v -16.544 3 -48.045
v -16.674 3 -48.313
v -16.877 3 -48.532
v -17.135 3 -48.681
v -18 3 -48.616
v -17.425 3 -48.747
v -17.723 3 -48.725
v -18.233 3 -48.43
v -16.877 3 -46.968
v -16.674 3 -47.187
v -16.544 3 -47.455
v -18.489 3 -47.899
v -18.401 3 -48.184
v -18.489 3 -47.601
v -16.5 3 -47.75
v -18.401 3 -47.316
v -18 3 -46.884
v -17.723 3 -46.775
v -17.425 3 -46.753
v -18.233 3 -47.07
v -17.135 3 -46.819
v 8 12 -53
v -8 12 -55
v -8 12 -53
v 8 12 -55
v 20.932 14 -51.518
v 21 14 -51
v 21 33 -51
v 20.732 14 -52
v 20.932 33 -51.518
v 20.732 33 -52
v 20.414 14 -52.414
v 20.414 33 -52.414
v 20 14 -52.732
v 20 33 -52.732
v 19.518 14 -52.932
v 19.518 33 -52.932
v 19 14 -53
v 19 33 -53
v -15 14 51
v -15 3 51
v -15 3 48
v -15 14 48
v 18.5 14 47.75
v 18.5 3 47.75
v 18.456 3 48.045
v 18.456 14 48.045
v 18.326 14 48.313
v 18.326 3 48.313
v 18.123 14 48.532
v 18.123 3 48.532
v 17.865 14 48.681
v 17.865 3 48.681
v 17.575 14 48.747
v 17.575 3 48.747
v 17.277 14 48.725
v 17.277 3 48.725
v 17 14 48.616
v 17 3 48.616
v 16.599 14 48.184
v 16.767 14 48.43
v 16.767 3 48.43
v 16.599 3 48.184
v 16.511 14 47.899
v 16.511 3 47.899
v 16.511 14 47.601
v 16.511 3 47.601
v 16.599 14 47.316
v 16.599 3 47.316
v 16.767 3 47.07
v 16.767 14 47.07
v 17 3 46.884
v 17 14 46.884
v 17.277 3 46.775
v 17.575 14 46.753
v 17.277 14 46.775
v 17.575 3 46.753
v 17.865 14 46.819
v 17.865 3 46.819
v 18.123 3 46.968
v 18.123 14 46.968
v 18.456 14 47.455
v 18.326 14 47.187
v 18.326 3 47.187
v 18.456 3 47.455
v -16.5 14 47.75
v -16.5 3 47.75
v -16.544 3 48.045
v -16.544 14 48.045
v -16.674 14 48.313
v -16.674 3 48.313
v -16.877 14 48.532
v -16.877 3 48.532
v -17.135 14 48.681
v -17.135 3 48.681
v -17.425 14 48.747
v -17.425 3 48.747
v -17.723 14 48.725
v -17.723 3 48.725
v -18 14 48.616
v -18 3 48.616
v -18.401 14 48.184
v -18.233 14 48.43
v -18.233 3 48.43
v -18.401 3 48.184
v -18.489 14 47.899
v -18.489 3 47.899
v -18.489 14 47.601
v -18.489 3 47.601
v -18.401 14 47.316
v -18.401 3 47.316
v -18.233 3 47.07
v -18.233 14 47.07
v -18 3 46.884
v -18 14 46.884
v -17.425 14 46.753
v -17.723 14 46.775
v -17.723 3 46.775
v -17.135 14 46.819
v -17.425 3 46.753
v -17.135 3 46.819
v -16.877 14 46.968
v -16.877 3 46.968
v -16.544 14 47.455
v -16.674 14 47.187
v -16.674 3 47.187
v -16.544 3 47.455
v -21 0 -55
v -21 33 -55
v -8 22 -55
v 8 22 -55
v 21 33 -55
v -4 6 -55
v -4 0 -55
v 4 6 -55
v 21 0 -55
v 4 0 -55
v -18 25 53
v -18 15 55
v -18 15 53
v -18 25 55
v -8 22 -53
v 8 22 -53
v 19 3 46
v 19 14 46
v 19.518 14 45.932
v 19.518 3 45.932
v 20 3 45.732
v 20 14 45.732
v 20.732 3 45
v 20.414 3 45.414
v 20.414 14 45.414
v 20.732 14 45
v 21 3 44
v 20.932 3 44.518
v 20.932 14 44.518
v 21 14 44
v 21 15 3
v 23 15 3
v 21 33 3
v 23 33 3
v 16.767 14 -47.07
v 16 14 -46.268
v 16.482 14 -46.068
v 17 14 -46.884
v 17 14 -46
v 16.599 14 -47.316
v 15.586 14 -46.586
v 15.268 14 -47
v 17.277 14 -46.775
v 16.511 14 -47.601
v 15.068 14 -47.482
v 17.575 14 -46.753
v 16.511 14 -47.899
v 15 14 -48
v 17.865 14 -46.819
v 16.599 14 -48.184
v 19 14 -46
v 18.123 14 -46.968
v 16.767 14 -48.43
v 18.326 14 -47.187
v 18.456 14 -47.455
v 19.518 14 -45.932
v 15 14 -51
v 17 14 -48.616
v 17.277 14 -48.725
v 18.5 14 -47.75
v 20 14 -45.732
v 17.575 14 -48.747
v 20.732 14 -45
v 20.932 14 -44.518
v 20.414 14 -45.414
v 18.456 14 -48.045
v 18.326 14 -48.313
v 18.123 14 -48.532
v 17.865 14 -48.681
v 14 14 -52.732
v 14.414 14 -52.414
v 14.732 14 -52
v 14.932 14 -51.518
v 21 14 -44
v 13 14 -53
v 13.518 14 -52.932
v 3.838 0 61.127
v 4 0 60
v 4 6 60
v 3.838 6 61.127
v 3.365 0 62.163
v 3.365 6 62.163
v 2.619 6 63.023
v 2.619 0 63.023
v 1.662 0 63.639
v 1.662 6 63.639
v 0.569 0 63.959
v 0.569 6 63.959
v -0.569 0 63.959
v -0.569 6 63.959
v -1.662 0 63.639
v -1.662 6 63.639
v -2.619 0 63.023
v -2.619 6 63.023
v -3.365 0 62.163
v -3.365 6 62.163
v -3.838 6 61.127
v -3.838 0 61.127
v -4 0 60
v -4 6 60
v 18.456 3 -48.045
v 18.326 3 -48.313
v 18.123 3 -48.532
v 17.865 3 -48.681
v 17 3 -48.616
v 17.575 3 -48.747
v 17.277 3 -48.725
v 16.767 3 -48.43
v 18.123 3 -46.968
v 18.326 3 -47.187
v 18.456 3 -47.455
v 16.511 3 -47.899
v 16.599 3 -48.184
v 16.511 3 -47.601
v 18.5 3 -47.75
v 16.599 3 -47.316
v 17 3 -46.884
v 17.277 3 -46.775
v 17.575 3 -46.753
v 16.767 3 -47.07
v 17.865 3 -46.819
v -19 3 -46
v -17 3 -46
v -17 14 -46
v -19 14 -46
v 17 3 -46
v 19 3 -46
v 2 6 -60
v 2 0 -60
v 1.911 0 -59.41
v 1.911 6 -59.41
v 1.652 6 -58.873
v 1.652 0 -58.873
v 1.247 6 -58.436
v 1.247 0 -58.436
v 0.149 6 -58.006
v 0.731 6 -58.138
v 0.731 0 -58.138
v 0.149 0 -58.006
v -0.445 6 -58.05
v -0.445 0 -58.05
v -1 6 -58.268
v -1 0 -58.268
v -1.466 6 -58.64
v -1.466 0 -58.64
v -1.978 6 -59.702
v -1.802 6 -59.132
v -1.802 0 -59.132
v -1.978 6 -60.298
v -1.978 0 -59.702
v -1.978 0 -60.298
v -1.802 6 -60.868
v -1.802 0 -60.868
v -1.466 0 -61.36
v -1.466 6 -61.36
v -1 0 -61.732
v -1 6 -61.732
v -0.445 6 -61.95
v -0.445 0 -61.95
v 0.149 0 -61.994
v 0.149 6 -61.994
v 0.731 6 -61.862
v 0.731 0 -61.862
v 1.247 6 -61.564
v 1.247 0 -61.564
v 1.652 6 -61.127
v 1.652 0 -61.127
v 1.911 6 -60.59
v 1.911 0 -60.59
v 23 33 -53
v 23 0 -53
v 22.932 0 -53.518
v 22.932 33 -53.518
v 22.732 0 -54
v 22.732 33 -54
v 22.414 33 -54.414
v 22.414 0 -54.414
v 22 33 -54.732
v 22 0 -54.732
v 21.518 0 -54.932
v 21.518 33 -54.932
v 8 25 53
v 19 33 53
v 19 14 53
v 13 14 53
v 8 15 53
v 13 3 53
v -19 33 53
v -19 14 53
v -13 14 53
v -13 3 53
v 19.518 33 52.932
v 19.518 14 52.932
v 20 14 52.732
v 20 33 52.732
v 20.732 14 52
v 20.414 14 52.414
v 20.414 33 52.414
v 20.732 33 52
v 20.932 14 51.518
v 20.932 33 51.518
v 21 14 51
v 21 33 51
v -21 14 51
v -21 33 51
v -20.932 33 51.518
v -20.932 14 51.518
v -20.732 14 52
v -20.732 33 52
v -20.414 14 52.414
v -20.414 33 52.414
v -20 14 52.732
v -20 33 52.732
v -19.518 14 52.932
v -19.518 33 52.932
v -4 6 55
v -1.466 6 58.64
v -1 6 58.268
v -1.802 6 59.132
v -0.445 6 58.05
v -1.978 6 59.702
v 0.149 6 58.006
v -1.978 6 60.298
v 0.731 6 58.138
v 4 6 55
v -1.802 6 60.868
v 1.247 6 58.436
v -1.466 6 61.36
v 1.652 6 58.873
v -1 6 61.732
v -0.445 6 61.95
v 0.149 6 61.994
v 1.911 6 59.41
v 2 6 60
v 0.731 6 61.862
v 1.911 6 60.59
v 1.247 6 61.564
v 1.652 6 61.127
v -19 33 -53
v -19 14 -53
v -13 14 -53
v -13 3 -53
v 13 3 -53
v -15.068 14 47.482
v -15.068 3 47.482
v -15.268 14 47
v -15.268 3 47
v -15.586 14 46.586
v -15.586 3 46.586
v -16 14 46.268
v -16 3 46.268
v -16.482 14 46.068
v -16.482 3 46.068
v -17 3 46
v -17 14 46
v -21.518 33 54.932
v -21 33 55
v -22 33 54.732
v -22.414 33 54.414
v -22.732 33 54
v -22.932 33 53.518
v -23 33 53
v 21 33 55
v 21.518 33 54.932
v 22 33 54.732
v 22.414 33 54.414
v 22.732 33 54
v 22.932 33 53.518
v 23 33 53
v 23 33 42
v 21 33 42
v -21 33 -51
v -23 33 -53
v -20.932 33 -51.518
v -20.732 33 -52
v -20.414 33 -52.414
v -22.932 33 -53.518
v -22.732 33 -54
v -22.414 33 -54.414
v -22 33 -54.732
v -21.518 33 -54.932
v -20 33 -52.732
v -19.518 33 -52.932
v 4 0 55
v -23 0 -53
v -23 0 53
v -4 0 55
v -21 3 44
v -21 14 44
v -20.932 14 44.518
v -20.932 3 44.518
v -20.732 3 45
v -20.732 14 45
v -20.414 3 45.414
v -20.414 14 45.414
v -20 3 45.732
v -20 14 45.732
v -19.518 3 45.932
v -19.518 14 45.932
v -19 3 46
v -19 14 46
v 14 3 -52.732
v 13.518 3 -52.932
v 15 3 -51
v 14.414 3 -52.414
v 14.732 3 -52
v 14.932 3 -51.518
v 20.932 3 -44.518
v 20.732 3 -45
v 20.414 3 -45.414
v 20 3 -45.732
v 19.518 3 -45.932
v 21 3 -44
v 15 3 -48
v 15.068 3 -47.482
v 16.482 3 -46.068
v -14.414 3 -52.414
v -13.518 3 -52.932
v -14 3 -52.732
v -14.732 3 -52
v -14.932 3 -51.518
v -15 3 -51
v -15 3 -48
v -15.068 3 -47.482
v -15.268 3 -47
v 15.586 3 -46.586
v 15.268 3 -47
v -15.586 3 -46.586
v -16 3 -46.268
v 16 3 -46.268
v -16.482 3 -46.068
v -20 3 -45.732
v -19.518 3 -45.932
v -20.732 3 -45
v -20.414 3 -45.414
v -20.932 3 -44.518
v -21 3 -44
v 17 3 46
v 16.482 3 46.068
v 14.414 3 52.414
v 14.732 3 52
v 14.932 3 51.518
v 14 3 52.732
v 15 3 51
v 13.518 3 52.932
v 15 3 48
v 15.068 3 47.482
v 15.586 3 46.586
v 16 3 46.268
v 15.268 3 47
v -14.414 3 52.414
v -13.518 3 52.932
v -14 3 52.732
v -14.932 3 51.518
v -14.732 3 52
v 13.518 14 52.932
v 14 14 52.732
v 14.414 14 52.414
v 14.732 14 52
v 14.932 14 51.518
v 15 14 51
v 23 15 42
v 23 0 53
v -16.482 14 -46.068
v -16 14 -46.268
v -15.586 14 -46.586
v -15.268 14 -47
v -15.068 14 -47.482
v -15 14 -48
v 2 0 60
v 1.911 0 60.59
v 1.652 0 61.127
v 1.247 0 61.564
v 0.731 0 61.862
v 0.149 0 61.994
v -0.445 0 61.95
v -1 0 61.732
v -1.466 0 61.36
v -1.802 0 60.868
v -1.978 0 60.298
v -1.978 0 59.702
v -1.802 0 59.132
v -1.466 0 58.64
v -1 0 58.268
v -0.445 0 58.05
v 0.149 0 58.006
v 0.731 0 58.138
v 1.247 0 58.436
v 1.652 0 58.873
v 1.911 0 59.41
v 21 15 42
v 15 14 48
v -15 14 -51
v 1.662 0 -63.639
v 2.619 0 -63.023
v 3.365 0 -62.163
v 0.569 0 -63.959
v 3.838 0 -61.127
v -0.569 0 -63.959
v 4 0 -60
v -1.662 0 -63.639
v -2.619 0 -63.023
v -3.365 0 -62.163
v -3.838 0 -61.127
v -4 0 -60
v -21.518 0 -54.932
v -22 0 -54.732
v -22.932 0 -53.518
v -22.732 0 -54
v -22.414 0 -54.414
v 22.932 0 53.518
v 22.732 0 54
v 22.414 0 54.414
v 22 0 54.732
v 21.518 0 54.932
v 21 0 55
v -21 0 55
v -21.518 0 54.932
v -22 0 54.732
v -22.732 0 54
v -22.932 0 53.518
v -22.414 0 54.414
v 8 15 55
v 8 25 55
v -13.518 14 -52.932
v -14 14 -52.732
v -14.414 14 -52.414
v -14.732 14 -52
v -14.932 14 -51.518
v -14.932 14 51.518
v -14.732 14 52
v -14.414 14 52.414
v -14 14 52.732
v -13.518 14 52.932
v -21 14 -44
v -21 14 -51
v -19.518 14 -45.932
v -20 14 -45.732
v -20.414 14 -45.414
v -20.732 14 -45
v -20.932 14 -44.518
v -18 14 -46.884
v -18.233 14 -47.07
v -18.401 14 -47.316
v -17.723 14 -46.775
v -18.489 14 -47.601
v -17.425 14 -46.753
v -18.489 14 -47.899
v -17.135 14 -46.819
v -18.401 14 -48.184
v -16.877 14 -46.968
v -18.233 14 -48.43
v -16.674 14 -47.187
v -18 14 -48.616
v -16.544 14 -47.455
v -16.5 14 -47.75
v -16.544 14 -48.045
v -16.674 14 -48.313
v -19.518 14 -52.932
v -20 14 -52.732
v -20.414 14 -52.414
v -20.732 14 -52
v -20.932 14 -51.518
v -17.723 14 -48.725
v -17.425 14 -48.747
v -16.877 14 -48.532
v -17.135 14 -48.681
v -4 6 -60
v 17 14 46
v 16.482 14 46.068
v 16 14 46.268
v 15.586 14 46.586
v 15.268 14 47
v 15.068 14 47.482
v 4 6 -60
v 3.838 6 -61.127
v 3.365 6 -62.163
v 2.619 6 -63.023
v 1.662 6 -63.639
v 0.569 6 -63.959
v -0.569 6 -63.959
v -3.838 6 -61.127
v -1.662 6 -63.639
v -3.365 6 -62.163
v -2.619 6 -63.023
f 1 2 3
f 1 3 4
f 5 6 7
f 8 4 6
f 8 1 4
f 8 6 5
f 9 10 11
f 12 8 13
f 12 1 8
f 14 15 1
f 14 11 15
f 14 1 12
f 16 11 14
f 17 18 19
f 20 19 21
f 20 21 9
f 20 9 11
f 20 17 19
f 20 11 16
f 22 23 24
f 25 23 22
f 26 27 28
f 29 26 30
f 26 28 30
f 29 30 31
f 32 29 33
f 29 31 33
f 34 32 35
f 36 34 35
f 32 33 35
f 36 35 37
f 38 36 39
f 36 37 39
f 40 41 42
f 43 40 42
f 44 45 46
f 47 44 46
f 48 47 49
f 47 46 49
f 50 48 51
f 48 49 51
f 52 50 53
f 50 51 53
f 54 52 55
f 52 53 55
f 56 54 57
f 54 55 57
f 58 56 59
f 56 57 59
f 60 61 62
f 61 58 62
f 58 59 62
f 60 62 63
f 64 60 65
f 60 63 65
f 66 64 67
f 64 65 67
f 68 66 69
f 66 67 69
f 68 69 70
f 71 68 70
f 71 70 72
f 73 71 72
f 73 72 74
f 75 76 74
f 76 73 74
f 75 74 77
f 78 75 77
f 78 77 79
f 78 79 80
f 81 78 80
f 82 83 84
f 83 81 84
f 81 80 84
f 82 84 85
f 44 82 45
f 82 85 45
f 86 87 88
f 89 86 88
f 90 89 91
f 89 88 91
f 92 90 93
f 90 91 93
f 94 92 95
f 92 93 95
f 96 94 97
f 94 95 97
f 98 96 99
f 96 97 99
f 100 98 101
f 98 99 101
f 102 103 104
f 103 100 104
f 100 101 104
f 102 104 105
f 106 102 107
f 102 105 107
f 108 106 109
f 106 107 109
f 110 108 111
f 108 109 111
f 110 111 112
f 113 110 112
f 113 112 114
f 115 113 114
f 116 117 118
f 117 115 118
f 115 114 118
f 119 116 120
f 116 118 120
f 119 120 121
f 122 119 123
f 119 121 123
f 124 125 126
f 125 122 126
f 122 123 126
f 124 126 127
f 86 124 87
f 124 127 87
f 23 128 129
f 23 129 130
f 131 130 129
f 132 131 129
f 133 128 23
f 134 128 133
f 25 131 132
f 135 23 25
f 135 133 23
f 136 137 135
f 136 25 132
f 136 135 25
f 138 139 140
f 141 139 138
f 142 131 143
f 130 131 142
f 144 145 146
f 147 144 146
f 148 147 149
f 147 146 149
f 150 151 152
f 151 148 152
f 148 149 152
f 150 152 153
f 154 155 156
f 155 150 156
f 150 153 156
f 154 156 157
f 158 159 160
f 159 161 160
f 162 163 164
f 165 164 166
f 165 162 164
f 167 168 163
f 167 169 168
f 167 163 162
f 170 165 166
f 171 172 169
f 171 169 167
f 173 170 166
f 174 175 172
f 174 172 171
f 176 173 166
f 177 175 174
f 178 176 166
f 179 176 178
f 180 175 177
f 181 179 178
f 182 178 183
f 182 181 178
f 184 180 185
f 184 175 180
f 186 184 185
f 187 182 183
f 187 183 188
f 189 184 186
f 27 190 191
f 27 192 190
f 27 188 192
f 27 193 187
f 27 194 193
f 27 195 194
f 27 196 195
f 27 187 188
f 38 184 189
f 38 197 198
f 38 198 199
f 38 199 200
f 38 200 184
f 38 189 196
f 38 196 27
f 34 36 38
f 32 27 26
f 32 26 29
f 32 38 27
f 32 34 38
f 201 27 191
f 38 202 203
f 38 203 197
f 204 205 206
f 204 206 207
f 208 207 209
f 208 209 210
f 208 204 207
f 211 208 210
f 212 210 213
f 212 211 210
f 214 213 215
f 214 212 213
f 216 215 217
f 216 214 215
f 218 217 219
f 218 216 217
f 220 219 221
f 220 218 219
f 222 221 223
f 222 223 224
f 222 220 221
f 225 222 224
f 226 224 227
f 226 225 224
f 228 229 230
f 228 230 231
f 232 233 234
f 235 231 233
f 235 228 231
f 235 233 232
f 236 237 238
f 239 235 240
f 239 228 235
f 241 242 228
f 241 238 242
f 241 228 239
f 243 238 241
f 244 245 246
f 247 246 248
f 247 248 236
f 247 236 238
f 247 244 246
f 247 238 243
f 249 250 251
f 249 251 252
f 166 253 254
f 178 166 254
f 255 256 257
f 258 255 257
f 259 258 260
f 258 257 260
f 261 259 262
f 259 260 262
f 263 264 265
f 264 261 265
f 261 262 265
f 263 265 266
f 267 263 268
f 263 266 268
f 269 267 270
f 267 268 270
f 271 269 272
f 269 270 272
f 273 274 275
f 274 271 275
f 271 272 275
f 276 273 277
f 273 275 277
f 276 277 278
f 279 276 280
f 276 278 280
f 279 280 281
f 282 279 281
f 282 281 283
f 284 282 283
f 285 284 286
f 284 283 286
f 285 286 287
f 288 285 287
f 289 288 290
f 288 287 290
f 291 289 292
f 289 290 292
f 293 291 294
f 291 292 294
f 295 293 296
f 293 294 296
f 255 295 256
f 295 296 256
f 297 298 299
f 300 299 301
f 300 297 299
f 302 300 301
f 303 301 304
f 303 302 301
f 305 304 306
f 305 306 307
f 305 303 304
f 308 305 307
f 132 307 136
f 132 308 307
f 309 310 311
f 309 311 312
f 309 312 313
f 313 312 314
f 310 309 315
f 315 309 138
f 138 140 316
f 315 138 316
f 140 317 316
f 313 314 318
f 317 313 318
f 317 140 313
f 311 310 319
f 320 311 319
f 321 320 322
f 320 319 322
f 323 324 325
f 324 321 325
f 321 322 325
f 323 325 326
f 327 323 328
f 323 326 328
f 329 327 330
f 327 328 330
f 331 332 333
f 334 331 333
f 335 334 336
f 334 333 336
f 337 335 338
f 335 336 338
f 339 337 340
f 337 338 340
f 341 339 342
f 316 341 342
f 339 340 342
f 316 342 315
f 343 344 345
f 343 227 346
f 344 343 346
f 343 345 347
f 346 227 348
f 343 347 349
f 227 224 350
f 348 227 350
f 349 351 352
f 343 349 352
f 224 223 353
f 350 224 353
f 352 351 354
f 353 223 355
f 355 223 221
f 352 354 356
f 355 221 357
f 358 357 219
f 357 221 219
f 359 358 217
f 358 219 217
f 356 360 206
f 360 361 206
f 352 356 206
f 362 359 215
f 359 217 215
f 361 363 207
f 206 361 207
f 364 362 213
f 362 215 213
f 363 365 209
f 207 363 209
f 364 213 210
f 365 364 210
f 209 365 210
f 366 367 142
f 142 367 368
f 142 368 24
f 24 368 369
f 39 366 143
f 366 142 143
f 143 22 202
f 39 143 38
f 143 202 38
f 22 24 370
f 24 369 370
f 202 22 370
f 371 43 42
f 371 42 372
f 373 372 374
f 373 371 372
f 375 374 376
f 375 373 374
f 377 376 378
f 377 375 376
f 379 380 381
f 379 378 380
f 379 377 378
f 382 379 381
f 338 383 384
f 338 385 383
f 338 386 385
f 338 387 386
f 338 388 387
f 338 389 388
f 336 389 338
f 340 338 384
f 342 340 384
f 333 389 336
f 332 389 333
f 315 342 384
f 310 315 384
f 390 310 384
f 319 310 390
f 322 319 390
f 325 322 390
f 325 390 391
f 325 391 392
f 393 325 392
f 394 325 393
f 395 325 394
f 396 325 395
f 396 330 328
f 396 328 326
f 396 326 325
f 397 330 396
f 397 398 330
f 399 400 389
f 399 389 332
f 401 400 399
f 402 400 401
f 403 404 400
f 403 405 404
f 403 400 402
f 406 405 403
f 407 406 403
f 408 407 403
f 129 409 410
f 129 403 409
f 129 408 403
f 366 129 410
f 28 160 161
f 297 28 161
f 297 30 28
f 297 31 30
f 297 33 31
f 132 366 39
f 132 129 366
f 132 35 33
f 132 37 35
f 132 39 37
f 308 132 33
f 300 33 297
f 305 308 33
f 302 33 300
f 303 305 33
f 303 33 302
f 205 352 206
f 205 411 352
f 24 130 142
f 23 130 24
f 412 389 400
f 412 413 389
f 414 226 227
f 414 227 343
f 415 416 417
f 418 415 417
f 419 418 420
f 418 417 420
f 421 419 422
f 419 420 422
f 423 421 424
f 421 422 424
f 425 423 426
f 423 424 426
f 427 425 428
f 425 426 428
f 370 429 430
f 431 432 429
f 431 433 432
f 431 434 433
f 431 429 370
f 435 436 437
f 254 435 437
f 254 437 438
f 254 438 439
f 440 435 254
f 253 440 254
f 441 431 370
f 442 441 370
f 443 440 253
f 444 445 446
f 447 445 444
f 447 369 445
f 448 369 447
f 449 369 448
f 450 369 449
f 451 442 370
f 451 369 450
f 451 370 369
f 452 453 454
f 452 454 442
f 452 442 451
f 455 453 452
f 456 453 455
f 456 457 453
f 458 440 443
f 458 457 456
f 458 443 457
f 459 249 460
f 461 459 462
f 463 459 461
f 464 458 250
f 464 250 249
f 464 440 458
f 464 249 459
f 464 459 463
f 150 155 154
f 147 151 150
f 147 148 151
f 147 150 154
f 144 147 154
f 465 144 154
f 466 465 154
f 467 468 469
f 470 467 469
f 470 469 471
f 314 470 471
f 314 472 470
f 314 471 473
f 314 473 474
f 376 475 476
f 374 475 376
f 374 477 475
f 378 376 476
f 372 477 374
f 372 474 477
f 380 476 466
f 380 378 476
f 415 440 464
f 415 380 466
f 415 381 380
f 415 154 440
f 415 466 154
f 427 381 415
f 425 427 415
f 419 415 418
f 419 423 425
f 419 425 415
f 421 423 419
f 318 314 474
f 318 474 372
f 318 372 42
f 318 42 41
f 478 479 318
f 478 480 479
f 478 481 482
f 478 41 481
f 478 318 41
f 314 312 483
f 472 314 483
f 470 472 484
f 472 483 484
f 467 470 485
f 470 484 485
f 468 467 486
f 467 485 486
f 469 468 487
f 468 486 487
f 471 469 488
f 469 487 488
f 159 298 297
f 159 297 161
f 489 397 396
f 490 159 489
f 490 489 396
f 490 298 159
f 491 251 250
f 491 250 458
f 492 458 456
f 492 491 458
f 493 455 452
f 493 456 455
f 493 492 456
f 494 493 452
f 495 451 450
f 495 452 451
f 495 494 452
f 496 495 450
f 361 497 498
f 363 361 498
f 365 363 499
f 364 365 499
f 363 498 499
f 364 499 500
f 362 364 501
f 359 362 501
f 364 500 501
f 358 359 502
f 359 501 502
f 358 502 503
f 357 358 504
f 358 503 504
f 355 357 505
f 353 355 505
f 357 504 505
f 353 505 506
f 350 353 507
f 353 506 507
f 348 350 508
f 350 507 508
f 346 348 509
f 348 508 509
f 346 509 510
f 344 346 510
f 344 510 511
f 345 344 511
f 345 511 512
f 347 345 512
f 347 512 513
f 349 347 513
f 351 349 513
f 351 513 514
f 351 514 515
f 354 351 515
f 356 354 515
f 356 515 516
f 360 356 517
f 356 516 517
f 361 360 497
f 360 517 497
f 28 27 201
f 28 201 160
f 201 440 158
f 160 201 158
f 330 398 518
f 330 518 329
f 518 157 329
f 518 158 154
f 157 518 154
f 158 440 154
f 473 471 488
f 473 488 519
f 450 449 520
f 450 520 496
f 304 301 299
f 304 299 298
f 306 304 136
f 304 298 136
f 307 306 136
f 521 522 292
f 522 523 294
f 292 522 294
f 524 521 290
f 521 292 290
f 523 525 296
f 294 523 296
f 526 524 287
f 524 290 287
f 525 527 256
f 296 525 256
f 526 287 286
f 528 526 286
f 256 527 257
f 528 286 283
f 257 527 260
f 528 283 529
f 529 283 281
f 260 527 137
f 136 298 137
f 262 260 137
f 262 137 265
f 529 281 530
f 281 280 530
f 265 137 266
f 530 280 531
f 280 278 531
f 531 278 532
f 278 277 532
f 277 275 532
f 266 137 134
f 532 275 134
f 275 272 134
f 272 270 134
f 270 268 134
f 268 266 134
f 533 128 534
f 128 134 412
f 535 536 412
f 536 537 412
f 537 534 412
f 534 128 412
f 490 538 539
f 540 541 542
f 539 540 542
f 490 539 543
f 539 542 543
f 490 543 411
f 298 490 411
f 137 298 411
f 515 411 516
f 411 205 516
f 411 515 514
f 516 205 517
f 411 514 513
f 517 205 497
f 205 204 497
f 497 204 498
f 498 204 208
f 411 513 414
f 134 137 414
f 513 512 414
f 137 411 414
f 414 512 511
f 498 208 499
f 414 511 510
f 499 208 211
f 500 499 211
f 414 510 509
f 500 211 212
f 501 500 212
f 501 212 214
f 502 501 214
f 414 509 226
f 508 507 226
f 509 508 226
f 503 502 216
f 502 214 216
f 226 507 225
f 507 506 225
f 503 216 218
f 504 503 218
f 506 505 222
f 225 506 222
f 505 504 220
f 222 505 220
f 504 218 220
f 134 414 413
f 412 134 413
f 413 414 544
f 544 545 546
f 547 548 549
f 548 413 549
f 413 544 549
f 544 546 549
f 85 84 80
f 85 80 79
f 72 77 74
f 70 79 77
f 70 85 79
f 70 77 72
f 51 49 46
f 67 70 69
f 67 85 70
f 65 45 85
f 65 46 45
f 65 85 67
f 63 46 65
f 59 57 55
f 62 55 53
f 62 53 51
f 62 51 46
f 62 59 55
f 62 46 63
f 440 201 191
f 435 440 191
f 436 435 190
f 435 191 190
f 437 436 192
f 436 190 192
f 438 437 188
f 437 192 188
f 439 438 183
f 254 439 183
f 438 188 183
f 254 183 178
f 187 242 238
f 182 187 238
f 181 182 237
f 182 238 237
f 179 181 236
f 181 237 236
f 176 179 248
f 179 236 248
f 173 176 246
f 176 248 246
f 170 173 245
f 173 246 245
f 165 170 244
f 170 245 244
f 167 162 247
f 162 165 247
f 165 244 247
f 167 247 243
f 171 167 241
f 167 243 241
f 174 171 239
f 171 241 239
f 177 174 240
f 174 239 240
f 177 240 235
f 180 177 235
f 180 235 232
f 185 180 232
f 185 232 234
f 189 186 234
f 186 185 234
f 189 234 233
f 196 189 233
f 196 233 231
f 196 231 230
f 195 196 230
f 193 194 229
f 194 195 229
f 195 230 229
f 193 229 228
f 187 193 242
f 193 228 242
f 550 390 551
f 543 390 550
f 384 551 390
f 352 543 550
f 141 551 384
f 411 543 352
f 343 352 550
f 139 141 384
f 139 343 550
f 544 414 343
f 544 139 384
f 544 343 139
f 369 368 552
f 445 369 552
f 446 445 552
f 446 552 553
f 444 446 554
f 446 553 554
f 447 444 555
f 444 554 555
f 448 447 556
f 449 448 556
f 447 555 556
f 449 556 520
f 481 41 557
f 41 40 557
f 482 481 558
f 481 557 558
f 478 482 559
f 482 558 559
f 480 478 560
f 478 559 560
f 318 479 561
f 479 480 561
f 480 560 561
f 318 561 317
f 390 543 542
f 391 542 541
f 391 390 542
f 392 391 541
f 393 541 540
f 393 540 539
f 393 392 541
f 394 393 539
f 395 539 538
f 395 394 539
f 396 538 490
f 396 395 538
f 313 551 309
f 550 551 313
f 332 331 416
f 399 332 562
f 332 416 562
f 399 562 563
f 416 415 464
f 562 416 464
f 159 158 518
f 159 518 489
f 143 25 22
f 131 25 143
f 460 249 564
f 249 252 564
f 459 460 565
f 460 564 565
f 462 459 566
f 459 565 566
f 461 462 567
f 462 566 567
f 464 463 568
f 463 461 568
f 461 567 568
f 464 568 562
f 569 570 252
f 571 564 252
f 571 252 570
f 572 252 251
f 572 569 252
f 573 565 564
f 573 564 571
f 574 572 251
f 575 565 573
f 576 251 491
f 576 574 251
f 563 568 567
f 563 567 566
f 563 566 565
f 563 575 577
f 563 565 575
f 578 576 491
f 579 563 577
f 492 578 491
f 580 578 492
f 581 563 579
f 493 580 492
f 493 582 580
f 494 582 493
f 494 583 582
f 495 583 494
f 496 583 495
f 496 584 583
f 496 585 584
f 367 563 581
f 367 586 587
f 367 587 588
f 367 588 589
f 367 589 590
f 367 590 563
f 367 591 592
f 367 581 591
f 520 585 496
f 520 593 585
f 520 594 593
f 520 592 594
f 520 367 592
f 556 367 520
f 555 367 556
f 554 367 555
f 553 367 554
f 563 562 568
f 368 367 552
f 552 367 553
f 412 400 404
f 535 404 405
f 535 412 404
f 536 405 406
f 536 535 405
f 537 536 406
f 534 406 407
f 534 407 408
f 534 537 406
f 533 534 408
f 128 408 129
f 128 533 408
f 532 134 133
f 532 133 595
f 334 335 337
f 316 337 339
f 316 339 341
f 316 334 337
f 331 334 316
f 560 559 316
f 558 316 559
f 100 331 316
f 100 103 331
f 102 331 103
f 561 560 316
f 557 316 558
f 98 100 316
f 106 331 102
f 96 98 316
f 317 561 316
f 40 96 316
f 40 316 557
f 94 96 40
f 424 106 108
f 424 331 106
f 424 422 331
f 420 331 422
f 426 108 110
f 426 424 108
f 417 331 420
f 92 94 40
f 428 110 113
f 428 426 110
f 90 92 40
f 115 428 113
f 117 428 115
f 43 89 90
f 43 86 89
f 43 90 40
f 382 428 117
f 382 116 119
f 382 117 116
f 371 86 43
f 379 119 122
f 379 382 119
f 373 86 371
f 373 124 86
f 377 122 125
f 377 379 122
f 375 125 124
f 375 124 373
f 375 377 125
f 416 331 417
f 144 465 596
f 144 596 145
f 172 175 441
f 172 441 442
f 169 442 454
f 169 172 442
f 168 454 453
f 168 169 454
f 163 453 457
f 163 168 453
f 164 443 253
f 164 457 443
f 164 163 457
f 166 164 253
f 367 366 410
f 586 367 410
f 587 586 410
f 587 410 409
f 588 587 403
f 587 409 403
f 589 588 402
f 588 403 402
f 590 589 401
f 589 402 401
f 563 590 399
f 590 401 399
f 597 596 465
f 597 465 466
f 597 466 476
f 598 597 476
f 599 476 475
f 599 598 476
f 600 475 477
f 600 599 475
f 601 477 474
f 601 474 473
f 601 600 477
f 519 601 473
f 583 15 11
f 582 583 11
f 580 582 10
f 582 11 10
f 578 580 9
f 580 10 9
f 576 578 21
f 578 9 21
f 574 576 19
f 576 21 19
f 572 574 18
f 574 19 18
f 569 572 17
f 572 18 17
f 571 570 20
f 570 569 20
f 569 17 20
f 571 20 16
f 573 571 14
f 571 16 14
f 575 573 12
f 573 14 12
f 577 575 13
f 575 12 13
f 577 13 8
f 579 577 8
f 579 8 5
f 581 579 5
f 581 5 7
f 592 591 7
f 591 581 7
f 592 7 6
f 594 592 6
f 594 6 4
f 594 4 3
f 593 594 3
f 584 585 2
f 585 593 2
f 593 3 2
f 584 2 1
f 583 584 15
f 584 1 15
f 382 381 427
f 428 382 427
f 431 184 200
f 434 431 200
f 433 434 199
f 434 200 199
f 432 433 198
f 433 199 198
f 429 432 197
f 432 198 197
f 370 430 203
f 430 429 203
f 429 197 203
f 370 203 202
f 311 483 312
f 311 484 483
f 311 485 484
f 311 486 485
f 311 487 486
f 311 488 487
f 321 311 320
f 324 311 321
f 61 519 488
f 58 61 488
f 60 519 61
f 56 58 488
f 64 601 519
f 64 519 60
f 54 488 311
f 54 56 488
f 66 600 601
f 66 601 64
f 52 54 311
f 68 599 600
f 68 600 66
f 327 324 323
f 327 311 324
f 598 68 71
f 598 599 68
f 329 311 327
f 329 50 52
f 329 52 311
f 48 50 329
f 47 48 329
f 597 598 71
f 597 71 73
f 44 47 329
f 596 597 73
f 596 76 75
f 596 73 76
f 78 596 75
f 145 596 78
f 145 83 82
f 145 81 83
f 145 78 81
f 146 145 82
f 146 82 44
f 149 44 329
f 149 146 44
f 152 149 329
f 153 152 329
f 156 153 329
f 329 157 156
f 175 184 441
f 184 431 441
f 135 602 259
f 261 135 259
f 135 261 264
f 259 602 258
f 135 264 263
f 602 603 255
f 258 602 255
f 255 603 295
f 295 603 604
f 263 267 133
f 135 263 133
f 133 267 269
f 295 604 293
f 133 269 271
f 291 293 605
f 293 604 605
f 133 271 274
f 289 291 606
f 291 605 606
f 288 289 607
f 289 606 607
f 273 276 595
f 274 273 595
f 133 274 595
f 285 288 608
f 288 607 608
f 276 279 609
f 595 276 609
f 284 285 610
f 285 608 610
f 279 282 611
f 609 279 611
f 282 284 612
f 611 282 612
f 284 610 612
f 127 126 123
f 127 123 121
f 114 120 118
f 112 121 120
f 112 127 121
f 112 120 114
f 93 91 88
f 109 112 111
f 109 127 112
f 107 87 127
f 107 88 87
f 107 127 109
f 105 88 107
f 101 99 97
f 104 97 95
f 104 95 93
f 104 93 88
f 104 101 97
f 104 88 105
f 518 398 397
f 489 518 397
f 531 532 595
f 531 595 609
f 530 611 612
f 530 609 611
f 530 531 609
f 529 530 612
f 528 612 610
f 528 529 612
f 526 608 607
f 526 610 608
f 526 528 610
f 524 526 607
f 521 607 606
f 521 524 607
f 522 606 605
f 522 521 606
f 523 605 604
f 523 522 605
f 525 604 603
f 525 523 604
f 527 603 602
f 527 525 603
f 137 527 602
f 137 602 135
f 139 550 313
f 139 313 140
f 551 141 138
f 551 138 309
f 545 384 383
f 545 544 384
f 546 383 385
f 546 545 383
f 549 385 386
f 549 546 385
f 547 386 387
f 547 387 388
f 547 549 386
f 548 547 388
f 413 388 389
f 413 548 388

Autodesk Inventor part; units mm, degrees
ref_plane "YZ Plane" through (0, 0, 0) normal (1, 0, 0) x (0, 1, 0)
ref_plane "XZ Plane" through (0, 0, 0) normal (0, 1, 0) x (-1, 0, 0)
ref_plane "XY Plane" through (0, 0, 0) normal (0, 0, 1) x (1, 0, 0)
sketch "Sketch1" plane through (0, 0, 0) normal (0, 1, 0) x (-1, 0, 0)
  line L0 (-23, 55) -> (23, 55)
  line L1 (23, 55) -> (23, -55)
  line L2 (23, -55) -> (-23, -55)
  line L3 (-23, -55) -> (-23, 55)
  line L4 (-23, 55) -> (23, -55) construction
  line L5 (23, 55) -> (-23, -55) construction
  point P0 (0, 0)
  dimension "d0" = 46
  dimension "d1" = 110
extrude "Extrusion1" add sketch "Sketch1" along normal blind 3
sketch "Sketch2" plane through (0, 3, 0) normal (0, 1, 0) x (1, 0, 0)
  line L0 (-23, 55) -> (-23, -55) projected
  line L1 (23, -55) -> (-23, -55)
  line L2 (-23, -55) -> (-23, 55)
  line L3 (-23, 55) -> (23, 55)
  line L4 (23, 55) -> (23, -55)
  line L5 (23, -55) -> (-23, 55) construction
  line L6 (-23, -55) -> (23, 55) construction
  line L7 (21, -53) -> (-21, -53)
  line L8 (-21, -53) -> (-21, 53)
  line L9 (-21, 53) -> (21, 53)
  line L10 (21, 53) -> (21, -53)
  line L11 (21, -53) -> (-21, 53) construction
  line L12 (-21, -53) -> (21, 53) construction
  point P0 (0, 0)
  dimension "d4" = 42
  dimension "d5" = 106
extrude "Extrusion2" add sketch "Sketch2" along normal blind 30
sketch "Sketch5" plane through (0, 33, 0) normal (0, 1, 0) x (1, 0, 0)
  line L0 (23, 55) -> (-23, 55) projected
  line L1 (23, -55) -> (23, 55) projected
  line L2 (-23, 55) -> (-23, -55) projected
  line L3 (21, 53) -> (21, -53) projected
  line L4 (21, -42) -> (23, -42)
  line L5 (23, -42) -> (23, -3)
  line L6 (23, -3) -> (21, -3)
  line L7 (21, -3) -> (21, -42)
  line L8 (-23, -55) -> (23, -55) projected
  point P0 (0, 0)
  point P1 (22, -42)
  point P2 (22, -3)
  dimension "d24" = 13
  dimension "d25" = 58
extrude "Extrusion5" cut sketch "Sketch5" against normal blind 18 contours L1 L4 L3 L6
sketch "Sketch6" plane through (23, 0, -55) normal (0, 0, -1) x (-1, 0, 0)
  line L0 (15, 22) -> (31, 22)
  line L1 (31, 22) -> (31, 12)
  line L2 (31, 12) -> (15, 12)
  line L3 (15, 12) -> (15, 22)
  line L4 (46, 0) -> (46, 33) projected
  line L5 (0, 0) -> (46, 0) projected
  point P0 (23, 0)
  dimension "d28" = 16
  dimension "d29" = 15
  dimension "d30" = 10
  dimension "d32" = 12
extrude "Extrusion6" cut sketch "Sketch6" against normal blind 15
sketch "Sketch7" plane through (-23, 0, 55) normal (0, 0, 1) x (1, 0, 0)
  line L0 (5, 25) -> (31, 25)
  line L1 (31, 25) -> (31, 15)
  line L2 (31, 15) -> (5, 15)
  line L3 (5, 15) -> (5, 25)
  line L4 (0, 0) -> (0, 33) projected
  line L5 (0, 0) -> (46, 0) projected
  point P0 (23, 0)
  dimension "d35" = 5
  dimension "d36" = 10
  dimension "d37" = 15
  dimension "d38" = 26
extrude "Extrusion7" cut sketch "Sketch7" against normal blind 15
sketch "Sketch9" plane through (0, 33, 0) normal (0, 1, 0) x (1, 0, 0)
  circle A0 centre (0, -60) radius 2
  line L0 (-23, -55) -> (23, -55) projected
  line L1 (4, -55) -> (-4, -55)
  line L2 (-4, -55) -> (-4, -60)
  line L3 (4, -60) -> (4, -55)
  arc A1 (-4, -60) -> (4, -60) centre (0, -60) ccw
  circle A2 centre (0, 60) radius 2
  line L4 (23, 55) -> (-23, 55) projected
  line L5 (4, 55) -> (-4, 55)
  line L6 (-4, 55) -> (-4, 60)
  line L7 (4, 60) -> (4, 55)
  arc A3 (4, 60) -> (-4, 60) centre (0, 60) ccw
  point P0 (0, 0)
  point P1 (0, -55)
  point P2 (0, -55)
  point P3 (0, 55)
  point P4 (0, 55)
  point P5 (0, 55)
  dimension "d77" = 4
  dimension "d78" = 5
  dimension "d79" = 8
  dimension "d80" = 4
  dimension "d81" = 4
  dimension "d82" = 4
  dimension "d83" = 5
  dimension "d84" = 8
  dimension "d85" = 4
extrude "Extrusion10" [suppressed]
fillet "Fillet2" [suppressed]
sketch "Sketch11" plane through (0, 3, 0) normal (0, 1, 0) x (1, 0, 0)
  circle A0 centre (-17.5, 47.75) radius 1
  circle A1 centre (17.5, 47.75) radius 1
  circle A2 centre (-17.5, -47.75) radius 1
  circle A3 centre (17.5, -47.75) radius 1
  line L0 (-21, 53) -> (-21, -53) projected
  line L1 (-21, 53) -> (-15, 53)
  line L2 (-15, 53) -> (-15, 46)
  line L3 (-15, 46) -> (-21, 46)
  line L4 (-21, 46) -> (-21, 53)
  line L5 (21, 53) -> (-21, 53) projected
  line L6 (21, 53) -> (15, 53)
  line L7 (15, 53) -> (15, 46)
  line L8 (15, 46) -> (21, 46)
  line L9 (21, 46) -> (21, 53)
  line L10 (-21, -53) -> (-15, -53)
  line L11 (-15, -53) -> (-15, -46)
  line L12 (-15, -46) -> (-21, -46)
  line L13 (-21, -46) -> (-21, -53)
  line L14 (21, -53) -> (15, -53)
  line L15 (15, -53) -> (15, -46)
  line L16 (15, -46) -> (21, -46)
  line L17 (21, -46) -> (21, -53)
  point P0 (0, 0)
  dimension "d95" = 2
  dimension "d96" = 2
  dimension "d97" = 2
  dimension "d98" = 2
  dimension "d99" = 95.5
  dimension "d100" = 35
  dimension "d101" = 47.75
  dimension "d102" = 17.5
  dimension "d103" = 6
  dimension "d104" = 7
  dimension "d105" = 6
  dimension "d106" = 7
  dimension "d107" = 6
  dimension "d108" = 7
  dimension "d109" = 6
  dimension "d110" = 7
extrude "Extrusion11" add sketch "Sketch11" along normal blind 11
fillet "Fillet6" radius 2 20 edges at (-23, 16.5, -55) (-23, 16.5, 55) (23, 16.5, 55) (23, 16.5, -55) (21, 23.5, -53) (-21, 23.5, -53) (-21, 23.5, 53) (21, 23.5, 53) (15, 8.5, -46) (-15, 8.5, -46) (15, 8.5, 46) (-15, 8.5, 46) (21, 8.5, -46) (15, 8.5, -53) (-15, 8.5, -53) (-21, 8.5, -46) (-21, 8.5, 46) (-15, 8.5, 53) (21, 8.5, 46) (15, 8.5, 53)
sketch "Sketch12" plane through (0, 0, 0) normal (0, -1, 0) x (1, 0, 0)
  line L0 (0, 50) -> (0, 60) construction
  line L1 (-21, 55) -> (21, 55) projected
  line L2 (4, 50) -> (4, 60)
  line L3 (-4, 60) -> (-4, 50)
  arc A0 (-4, 50) -> (4, 50) centre (0, 50) ccw
  arc A1 (4, 60) -> (-4, 60) centre (0, 60) ccw
  circle A2 centre (0, 60) radius 2
  point P0 (0, 0)
  point P1 (0, 55)
  point P2 (-4, 55)
  point P3 (4, 55)
  dimension "d115" = 5
  dimension "d116" = 8
  dimension "d117" = 4
extrude "Extrusion12" add sketch "Sketch12" against normal blind 6 contours L3 A1 L2 L1
mirror "Mirror1" about plane through (0, 0, 0) normal (0, 0, 1) of "Extrusion12"
properties part number "M12StereoPiBracket"
